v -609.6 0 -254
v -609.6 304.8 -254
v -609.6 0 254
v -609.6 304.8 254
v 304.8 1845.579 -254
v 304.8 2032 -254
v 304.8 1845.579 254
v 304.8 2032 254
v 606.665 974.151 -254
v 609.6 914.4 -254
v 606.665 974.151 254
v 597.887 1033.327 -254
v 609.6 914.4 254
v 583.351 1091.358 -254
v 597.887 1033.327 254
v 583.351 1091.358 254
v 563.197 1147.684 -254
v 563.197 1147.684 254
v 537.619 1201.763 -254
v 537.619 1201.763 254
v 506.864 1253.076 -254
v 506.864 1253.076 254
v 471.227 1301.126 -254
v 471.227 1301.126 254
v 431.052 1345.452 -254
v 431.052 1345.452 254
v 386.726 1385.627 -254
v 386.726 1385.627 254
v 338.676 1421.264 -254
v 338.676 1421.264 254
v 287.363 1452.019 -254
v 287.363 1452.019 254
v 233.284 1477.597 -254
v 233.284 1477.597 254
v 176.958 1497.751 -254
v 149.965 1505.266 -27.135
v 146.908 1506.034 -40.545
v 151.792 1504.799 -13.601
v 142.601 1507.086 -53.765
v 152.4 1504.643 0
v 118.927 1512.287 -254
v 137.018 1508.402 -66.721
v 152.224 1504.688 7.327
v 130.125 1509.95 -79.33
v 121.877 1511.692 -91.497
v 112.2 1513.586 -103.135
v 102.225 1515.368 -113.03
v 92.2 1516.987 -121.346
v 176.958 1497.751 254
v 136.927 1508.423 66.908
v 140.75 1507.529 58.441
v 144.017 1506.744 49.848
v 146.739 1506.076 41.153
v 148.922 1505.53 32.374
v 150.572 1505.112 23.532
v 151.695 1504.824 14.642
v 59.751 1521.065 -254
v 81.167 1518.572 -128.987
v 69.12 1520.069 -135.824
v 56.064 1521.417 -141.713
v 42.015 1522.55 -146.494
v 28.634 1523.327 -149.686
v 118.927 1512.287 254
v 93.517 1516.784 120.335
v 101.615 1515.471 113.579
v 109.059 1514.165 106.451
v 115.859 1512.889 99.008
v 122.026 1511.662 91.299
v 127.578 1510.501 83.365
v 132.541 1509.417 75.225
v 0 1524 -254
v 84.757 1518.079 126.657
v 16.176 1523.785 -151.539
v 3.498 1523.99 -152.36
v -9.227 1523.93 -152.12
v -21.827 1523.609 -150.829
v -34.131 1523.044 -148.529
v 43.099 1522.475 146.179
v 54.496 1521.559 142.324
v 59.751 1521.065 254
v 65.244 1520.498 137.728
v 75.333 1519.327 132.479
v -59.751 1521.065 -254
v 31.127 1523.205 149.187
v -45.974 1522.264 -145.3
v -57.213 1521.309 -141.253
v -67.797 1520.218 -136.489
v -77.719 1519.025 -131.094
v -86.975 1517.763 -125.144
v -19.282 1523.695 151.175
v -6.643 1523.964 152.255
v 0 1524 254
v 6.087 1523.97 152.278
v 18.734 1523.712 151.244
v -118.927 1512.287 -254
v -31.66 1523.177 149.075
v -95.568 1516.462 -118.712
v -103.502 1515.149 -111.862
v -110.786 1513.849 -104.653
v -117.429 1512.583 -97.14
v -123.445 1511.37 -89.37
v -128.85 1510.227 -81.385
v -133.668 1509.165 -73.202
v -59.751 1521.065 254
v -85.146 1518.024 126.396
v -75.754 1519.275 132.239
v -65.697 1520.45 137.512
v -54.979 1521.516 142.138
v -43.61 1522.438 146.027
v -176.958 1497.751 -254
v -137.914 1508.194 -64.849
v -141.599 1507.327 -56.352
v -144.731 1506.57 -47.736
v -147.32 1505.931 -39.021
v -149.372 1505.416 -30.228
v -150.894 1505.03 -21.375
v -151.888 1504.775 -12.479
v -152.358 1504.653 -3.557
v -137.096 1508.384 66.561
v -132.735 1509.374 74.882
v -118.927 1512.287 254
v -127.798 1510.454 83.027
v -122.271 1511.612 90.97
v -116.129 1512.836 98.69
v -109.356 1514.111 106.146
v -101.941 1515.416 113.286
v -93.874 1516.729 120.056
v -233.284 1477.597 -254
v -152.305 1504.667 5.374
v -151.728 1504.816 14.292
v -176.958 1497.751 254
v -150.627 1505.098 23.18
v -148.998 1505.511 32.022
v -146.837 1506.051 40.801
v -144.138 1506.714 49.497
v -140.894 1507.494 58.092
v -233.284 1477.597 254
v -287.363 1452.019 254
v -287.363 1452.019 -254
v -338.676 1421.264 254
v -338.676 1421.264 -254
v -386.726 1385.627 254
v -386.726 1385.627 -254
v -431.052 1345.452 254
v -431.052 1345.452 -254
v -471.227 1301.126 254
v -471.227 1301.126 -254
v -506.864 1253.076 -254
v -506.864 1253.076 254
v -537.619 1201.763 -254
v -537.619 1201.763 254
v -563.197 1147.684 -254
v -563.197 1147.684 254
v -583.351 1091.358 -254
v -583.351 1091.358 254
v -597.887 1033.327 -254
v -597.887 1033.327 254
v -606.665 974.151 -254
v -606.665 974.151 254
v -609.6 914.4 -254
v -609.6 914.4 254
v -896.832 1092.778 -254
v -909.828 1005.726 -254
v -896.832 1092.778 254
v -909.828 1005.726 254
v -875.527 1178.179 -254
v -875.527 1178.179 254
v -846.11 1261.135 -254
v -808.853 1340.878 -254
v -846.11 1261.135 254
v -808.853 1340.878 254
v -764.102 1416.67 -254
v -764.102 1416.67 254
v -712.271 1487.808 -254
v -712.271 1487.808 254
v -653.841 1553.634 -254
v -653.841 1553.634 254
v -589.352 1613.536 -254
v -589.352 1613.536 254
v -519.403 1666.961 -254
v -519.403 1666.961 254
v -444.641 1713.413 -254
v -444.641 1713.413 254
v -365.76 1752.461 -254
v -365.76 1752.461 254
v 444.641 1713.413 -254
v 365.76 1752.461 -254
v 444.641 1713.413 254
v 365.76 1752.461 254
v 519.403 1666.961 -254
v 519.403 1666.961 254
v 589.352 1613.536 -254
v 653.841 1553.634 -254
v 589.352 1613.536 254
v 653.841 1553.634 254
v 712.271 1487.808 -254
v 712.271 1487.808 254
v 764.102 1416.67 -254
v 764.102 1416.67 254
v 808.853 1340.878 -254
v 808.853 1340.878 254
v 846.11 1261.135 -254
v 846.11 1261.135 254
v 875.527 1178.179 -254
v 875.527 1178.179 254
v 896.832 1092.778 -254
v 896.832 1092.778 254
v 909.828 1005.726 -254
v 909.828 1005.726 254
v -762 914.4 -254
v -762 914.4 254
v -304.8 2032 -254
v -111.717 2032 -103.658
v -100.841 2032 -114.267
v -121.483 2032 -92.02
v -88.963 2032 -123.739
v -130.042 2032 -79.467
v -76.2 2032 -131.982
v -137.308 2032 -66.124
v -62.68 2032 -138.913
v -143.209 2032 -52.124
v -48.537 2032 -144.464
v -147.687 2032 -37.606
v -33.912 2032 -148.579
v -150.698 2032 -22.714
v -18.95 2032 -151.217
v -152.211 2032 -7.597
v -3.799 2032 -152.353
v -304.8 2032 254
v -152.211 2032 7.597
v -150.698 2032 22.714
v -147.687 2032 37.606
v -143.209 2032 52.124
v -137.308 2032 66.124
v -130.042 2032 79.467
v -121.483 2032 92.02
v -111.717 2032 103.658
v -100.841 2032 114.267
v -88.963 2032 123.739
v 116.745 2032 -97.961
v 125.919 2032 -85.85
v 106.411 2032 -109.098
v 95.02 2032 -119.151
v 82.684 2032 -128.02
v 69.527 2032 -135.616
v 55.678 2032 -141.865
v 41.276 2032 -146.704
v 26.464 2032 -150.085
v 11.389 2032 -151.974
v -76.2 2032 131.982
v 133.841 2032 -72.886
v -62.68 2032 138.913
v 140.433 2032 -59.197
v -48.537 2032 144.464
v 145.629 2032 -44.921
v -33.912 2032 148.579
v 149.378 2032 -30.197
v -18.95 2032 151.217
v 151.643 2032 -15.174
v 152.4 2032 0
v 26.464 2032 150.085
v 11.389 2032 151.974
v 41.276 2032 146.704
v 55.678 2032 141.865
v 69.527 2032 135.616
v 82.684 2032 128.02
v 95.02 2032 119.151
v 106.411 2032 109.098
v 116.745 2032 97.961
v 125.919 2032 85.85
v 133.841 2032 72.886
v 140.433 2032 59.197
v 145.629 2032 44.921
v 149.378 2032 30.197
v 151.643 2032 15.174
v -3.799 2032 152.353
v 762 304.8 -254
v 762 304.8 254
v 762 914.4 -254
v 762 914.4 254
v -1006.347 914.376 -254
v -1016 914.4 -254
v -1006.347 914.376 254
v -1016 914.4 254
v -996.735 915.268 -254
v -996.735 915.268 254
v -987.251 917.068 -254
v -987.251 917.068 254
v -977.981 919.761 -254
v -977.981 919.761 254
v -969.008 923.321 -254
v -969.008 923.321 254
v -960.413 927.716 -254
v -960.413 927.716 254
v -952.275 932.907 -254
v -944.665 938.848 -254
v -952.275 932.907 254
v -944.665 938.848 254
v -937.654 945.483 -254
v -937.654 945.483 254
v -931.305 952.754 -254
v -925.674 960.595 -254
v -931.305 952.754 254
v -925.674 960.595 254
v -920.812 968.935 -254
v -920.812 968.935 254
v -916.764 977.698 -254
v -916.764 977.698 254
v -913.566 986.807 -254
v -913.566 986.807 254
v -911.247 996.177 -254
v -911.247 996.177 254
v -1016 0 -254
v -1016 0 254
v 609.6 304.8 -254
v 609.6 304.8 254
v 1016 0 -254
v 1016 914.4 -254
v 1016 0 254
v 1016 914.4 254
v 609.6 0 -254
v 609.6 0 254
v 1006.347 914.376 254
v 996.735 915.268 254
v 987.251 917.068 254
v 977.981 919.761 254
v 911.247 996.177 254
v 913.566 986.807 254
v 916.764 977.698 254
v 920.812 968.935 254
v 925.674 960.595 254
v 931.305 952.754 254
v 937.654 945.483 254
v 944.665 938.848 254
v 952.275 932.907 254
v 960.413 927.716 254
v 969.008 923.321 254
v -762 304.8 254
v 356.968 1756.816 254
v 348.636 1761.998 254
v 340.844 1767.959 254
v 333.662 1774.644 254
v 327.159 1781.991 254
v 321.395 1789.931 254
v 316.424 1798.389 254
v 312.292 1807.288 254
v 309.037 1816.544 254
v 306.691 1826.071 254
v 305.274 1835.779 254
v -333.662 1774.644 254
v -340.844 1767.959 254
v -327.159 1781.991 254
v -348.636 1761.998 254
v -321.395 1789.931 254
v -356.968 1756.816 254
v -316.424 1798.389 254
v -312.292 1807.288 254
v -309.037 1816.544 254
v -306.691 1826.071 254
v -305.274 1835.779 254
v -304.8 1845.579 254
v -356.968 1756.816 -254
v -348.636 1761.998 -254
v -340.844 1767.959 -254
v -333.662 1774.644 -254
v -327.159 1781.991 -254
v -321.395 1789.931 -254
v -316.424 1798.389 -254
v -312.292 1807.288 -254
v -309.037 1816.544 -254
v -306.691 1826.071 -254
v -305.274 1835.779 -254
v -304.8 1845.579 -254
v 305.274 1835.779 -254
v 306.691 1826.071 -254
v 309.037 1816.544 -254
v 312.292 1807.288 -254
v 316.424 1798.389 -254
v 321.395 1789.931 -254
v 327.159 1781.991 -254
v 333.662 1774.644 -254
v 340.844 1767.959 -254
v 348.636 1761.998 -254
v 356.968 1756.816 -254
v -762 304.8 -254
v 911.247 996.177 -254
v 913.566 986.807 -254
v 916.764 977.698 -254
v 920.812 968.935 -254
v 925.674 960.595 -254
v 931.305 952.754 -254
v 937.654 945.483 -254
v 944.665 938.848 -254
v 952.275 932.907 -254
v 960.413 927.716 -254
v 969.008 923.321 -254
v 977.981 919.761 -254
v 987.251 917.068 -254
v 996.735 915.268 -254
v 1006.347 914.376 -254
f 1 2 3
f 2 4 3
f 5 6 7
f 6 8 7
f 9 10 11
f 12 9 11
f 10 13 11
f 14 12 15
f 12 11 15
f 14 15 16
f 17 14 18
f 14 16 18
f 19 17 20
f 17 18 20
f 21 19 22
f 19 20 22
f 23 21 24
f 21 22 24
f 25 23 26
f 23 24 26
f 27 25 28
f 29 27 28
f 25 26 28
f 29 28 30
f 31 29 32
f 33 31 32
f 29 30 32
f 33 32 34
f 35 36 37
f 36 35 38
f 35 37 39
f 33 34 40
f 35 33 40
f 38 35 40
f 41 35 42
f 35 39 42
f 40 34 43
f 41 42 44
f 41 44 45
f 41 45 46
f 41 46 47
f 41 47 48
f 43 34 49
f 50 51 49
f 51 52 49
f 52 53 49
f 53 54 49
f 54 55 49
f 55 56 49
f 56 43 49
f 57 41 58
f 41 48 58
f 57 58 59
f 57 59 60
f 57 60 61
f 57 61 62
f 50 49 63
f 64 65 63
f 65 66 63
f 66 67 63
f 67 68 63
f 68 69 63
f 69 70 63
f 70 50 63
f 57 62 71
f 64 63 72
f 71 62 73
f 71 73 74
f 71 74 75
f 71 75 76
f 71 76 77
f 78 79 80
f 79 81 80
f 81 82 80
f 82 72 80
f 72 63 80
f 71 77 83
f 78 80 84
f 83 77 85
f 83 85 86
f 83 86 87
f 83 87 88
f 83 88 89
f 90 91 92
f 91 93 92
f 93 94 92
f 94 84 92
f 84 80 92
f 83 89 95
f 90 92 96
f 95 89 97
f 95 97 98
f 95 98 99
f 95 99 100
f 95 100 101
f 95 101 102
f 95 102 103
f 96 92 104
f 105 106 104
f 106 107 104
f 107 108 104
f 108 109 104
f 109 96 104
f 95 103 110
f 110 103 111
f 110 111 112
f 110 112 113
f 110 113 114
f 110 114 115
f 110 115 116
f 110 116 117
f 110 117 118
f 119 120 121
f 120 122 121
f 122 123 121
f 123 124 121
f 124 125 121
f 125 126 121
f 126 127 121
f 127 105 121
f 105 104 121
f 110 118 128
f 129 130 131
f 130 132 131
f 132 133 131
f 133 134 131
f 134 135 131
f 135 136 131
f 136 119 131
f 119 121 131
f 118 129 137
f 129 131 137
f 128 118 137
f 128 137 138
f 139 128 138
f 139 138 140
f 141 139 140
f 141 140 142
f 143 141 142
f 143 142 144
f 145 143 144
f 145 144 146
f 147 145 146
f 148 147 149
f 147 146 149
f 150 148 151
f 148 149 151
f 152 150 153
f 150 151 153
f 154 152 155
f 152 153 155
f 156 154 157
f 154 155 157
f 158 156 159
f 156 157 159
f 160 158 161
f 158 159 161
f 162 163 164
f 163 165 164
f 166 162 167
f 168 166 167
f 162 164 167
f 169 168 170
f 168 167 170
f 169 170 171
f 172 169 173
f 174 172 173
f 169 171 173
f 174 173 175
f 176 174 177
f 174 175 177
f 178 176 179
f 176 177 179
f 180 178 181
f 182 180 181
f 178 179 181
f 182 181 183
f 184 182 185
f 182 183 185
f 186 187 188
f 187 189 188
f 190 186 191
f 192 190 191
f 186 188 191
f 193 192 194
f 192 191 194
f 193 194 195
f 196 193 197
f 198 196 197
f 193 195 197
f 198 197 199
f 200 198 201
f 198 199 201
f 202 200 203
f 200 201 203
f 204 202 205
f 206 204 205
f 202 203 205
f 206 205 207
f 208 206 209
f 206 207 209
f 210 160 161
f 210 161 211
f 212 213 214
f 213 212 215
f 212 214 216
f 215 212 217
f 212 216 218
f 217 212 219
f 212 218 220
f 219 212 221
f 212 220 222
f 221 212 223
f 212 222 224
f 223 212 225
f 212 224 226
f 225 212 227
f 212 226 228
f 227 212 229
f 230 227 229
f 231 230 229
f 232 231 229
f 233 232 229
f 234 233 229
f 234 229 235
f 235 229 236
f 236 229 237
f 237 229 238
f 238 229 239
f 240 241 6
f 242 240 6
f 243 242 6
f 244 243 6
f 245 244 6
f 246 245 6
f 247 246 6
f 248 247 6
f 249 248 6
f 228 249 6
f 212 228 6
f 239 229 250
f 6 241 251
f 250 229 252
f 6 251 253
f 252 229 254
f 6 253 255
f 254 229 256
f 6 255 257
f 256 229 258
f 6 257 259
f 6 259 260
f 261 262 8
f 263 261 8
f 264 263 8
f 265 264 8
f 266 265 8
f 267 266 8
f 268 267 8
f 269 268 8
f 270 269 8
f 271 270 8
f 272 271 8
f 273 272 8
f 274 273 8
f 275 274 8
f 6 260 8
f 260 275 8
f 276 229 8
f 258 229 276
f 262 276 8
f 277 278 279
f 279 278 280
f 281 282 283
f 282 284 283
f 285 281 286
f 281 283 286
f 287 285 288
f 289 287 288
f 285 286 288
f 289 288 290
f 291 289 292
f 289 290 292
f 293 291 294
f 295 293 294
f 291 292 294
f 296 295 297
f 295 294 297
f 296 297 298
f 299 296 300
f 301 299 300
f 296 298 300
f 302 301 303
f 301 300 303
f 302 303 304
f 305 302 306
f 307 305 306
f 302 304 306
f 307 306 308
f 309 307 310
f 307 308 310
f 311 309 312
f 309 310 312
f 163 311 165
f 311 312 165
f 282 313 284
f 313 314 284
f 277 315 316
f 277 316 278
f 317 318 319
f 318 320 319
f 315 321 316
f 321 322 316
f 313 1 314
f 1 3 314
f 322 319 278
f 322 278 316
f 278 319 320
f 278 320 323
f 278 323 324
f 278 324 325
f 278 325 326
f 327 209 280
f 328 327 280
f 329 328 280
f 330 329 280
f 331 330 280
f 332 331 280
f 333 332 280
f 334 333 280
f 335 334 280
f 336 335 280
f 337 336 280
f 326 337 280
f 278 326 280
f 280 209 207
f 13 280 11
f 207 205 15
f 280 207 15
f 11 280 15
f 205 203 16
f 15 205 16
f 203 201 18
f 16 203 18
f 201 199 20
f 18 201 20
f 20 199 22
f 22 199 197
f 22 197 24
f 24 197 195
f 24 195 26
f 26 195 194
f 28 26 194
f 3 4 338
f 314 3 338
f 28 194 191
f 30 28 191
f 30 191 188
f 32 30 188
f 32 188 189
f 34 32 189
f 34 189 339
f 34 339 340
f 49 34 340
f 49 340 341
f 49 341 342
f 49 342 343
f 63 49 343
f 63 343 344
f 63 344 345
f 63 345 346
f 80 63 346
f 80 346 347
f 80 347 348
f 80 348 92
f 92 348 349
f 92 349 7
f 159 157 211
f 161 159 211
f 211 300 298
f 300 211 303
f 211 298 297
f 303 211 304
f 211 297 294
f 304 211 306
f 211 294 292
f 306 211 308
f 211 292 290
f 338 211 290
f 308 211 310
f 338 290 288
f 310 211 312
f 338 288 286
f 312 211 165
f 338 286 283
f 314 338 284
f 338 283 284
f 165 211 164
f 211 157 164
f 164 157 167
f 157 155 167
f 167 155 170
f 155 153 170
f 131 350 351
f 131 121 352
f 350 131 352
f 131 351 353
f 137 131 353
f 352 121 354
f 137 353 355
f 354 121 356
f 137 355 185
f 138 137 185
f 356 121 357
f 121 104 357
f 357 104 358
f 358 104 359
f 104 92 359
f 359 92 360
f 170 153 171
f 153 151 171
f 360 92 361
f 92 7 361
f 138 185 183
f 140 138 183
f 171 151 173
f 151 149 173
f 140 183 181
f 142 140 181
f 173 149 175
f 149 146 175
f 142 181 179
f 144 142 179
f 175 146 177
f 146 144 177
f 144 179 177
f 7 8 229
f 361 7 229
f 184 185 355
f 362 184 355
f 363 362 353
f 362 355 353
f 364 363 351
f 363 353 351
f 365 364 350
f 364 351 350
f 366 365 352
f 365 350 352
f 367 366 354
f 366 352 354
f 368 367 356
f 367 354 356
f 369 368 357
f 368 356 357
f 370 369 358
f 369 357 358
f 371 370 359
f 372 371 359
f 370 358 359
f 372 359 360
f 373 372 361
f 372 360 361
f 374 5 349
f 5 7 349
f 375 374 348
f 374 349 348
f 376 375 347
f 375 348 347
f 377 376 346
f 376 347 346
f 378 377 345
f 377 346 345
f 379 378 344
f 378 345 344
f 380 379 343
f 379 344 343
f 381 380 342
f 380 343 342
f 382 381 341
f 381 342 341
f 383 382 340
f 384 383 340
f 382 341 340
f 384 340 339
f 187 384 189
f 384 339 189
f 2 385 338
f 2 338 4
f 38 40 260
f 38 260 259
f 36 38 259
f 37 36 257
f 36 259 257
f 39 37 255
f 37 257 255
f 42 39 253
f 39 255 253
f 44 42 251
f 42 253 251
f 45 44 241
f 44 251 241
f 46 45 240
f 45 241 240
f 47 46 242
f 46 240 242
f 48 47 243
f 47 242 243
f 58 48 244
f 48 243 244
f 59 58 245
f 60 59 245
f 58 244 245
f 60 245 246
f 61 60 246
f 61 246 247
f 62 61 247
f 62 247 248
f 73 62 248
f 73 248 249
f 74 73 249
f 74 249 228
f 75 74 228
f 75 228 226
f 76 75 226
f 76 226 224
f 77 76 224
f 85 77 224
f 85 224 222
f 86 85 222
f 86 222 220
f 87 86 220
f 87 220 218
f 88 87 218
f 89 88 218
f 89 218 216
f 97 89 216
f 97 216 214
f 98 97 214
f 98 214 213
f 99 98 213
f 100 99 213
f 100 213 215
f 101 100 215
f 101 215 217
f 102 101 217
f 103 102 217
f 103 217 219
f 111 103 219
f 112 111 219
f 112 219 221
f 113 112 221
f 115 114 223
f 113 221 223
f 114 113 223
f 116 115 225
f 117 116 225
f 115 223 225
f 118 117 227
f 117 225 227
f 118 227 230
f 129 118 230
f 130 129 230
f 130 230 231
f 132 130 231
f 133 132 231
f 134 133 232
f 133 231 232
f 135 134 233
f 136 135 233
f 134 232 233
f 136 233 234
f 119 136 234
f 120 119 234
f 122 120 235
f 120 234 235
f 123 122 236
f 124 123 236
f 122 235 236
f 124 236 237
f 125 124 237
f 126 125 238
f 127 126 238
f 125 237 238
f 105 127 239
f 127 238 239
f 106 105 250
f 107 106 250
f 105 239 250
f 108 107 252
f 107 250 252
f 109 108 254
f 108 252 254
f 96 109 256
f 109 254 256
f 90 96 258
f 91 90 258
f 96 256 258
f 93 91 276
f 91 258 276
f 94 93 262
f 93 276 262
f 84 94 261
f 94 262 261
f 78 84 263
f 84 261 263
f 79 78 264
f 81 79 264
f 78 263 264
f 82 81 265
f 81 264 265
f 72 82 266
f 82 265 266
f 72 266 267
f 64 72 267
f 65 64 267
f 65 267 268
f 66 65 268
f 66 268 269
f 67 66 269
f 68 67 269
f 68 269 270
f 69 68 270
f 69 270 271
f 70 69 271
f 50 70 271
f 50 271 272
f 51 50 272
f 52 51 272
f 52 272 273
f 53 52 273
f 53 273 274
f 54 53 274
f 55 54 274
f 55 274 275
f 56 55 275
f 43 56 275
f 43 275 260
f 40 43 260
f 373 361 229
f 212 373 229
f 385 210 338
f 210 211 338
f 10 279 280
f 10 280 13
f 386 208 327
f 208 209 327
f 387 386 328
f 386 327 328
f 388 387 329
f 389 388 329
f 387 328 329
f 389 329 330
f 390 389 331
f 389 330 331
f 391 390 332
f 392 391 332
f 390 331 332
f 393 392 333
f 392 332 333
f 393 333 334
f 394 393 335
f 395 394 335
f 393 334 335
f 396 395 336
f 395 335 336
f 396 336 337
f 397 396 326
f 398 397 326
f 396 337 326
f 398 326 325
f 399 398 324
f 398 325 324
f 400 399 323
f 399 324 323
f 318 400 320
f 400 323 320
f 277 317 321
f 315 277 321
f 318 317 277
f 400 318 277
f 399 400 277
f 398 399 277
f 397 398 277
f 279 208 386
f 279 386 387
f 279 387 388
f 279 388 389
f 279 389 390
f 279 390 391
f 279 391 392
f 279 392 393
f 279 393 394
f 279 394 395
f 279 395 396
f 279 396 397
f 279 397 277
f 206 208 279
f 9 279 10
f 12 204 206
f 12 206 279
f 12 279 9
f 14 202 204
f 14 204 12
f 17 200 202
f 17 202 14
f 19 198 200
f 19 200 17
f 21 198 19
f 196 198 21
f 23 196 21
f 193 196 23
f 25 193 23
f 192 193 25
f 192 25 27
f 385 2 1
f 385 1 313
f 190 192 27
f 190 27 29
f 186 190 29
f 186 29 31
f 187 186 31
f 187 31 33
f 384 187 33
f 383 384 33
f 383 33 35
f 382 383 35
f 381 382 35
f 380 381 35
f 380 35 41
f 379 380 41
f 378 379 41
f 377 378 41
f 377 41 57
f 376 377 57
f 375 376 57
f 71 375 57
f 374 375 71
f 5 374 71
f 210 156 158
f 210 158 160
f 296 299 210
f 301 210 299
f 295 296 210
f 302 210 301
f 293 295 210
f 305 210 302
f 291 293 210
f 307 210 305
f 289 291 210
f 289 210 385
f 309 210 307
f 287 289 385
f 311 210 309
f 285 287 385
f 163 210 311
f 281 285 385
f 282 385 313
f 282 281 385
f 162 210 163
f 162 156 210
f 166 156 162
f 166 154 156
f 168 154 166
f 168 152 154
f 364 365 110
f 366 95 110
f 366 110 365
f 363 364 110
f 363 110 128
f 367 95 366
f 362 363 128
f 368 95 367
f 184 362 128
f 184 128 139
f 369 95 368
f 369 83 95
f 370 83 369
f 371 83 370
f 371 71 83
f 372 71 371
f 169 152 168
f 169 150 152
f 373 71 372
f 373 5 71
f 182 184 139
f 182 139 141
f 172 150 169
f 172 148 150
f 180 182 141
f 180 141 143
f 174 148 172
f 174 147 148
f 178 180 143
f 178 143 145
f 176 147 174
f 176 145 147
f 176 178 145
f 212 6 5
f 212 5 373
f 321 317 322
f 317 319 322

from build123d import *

# Parameters (mm, degrees)
BOSS_EXTRUDE1_DEPTH = 254
SKETCH2_R           = 152.4
CUT_EXTRUDE1_DEPTH  = 2033


with BuildPart() as part:
    # Sketch1 → Boss-Extrude1 (new body, symmetric)
    with BuildSketch(Plane.XY):
        with BuildLine():
            Line((-304.8, 2032), (304.8, 2032))
            Line((304.8, 2032), (304.8, 1845.579381215))
            ThreePointArc((304.8, 1845.579381215), (321.395341304, 1789.930769373), (365.76, 1752.461443094))
            ThreePointArc((365.76, 1752.461443094), (739.043152086, 1452.863164343), (909.828, 1005.725628473))
            ThreePointArc((909.828, 1005.725628473), (944.665425516, 938.847656099), (1016, 914.4))
            Line((1016, 914.4), (1016, 0))
            Line((1016, 0), (609.6, 0))
            Line((609.6, 0), (609.6, 304.8))
            Line((609.6, 304.8), (762, 304.8))
            Line((762, 304.8), (762, 914.4))
            Line((762, 914.4), (609.6, 914.4))
            ThreePointArc((609.6, 914.4), (0, 1524), (-609.6, 914.4))
            Line((-609.6, 914.4), (-762, 914.4))
            Line((-762, 914.4), (-762, 304.8))
            Line((-762, 304.8), (-609.6, 304.8))
            Line((-609.6, 304.8), (-609.6, 0))
            Line((-609.6, 0), (-1016, 0))
            Line((-1016, 0), (-1016, 914.4))
            ThreePointArc((-1016, 914.4), (-944.665425516, 938.847656099), (-909.828, 1005.725628473))
            ThreePointArc((-909.828, 1005.725628473), (-739.043152086, 1452.863164343), (-365.76, 1752.461443094))
            ThreePointArc((-365.76, 1752.461443094), (-321.395341304, 1789.930769373), (-304.8, 1845.579381215))
            Line((-304.8, 1845.579381215), (-304.8, 2032))
        make_face()
    extrude(amount=BOSS_EXTRUDE1_DEPTH, both=True)

    # Sketch2 → Cut-Extrude1 (cut, through all)
    with BuildSketch(Plane(origin=(0, 2032, 0), x_dir=(1, 0, 0), z_dir=(0, 1, 0))):
        Circle(SKETCH2_R)
    extrude(amount=-CUT_EXTRUDE1_DEPTH, mode=Mode.SUBTRACT)


solid = part.part
